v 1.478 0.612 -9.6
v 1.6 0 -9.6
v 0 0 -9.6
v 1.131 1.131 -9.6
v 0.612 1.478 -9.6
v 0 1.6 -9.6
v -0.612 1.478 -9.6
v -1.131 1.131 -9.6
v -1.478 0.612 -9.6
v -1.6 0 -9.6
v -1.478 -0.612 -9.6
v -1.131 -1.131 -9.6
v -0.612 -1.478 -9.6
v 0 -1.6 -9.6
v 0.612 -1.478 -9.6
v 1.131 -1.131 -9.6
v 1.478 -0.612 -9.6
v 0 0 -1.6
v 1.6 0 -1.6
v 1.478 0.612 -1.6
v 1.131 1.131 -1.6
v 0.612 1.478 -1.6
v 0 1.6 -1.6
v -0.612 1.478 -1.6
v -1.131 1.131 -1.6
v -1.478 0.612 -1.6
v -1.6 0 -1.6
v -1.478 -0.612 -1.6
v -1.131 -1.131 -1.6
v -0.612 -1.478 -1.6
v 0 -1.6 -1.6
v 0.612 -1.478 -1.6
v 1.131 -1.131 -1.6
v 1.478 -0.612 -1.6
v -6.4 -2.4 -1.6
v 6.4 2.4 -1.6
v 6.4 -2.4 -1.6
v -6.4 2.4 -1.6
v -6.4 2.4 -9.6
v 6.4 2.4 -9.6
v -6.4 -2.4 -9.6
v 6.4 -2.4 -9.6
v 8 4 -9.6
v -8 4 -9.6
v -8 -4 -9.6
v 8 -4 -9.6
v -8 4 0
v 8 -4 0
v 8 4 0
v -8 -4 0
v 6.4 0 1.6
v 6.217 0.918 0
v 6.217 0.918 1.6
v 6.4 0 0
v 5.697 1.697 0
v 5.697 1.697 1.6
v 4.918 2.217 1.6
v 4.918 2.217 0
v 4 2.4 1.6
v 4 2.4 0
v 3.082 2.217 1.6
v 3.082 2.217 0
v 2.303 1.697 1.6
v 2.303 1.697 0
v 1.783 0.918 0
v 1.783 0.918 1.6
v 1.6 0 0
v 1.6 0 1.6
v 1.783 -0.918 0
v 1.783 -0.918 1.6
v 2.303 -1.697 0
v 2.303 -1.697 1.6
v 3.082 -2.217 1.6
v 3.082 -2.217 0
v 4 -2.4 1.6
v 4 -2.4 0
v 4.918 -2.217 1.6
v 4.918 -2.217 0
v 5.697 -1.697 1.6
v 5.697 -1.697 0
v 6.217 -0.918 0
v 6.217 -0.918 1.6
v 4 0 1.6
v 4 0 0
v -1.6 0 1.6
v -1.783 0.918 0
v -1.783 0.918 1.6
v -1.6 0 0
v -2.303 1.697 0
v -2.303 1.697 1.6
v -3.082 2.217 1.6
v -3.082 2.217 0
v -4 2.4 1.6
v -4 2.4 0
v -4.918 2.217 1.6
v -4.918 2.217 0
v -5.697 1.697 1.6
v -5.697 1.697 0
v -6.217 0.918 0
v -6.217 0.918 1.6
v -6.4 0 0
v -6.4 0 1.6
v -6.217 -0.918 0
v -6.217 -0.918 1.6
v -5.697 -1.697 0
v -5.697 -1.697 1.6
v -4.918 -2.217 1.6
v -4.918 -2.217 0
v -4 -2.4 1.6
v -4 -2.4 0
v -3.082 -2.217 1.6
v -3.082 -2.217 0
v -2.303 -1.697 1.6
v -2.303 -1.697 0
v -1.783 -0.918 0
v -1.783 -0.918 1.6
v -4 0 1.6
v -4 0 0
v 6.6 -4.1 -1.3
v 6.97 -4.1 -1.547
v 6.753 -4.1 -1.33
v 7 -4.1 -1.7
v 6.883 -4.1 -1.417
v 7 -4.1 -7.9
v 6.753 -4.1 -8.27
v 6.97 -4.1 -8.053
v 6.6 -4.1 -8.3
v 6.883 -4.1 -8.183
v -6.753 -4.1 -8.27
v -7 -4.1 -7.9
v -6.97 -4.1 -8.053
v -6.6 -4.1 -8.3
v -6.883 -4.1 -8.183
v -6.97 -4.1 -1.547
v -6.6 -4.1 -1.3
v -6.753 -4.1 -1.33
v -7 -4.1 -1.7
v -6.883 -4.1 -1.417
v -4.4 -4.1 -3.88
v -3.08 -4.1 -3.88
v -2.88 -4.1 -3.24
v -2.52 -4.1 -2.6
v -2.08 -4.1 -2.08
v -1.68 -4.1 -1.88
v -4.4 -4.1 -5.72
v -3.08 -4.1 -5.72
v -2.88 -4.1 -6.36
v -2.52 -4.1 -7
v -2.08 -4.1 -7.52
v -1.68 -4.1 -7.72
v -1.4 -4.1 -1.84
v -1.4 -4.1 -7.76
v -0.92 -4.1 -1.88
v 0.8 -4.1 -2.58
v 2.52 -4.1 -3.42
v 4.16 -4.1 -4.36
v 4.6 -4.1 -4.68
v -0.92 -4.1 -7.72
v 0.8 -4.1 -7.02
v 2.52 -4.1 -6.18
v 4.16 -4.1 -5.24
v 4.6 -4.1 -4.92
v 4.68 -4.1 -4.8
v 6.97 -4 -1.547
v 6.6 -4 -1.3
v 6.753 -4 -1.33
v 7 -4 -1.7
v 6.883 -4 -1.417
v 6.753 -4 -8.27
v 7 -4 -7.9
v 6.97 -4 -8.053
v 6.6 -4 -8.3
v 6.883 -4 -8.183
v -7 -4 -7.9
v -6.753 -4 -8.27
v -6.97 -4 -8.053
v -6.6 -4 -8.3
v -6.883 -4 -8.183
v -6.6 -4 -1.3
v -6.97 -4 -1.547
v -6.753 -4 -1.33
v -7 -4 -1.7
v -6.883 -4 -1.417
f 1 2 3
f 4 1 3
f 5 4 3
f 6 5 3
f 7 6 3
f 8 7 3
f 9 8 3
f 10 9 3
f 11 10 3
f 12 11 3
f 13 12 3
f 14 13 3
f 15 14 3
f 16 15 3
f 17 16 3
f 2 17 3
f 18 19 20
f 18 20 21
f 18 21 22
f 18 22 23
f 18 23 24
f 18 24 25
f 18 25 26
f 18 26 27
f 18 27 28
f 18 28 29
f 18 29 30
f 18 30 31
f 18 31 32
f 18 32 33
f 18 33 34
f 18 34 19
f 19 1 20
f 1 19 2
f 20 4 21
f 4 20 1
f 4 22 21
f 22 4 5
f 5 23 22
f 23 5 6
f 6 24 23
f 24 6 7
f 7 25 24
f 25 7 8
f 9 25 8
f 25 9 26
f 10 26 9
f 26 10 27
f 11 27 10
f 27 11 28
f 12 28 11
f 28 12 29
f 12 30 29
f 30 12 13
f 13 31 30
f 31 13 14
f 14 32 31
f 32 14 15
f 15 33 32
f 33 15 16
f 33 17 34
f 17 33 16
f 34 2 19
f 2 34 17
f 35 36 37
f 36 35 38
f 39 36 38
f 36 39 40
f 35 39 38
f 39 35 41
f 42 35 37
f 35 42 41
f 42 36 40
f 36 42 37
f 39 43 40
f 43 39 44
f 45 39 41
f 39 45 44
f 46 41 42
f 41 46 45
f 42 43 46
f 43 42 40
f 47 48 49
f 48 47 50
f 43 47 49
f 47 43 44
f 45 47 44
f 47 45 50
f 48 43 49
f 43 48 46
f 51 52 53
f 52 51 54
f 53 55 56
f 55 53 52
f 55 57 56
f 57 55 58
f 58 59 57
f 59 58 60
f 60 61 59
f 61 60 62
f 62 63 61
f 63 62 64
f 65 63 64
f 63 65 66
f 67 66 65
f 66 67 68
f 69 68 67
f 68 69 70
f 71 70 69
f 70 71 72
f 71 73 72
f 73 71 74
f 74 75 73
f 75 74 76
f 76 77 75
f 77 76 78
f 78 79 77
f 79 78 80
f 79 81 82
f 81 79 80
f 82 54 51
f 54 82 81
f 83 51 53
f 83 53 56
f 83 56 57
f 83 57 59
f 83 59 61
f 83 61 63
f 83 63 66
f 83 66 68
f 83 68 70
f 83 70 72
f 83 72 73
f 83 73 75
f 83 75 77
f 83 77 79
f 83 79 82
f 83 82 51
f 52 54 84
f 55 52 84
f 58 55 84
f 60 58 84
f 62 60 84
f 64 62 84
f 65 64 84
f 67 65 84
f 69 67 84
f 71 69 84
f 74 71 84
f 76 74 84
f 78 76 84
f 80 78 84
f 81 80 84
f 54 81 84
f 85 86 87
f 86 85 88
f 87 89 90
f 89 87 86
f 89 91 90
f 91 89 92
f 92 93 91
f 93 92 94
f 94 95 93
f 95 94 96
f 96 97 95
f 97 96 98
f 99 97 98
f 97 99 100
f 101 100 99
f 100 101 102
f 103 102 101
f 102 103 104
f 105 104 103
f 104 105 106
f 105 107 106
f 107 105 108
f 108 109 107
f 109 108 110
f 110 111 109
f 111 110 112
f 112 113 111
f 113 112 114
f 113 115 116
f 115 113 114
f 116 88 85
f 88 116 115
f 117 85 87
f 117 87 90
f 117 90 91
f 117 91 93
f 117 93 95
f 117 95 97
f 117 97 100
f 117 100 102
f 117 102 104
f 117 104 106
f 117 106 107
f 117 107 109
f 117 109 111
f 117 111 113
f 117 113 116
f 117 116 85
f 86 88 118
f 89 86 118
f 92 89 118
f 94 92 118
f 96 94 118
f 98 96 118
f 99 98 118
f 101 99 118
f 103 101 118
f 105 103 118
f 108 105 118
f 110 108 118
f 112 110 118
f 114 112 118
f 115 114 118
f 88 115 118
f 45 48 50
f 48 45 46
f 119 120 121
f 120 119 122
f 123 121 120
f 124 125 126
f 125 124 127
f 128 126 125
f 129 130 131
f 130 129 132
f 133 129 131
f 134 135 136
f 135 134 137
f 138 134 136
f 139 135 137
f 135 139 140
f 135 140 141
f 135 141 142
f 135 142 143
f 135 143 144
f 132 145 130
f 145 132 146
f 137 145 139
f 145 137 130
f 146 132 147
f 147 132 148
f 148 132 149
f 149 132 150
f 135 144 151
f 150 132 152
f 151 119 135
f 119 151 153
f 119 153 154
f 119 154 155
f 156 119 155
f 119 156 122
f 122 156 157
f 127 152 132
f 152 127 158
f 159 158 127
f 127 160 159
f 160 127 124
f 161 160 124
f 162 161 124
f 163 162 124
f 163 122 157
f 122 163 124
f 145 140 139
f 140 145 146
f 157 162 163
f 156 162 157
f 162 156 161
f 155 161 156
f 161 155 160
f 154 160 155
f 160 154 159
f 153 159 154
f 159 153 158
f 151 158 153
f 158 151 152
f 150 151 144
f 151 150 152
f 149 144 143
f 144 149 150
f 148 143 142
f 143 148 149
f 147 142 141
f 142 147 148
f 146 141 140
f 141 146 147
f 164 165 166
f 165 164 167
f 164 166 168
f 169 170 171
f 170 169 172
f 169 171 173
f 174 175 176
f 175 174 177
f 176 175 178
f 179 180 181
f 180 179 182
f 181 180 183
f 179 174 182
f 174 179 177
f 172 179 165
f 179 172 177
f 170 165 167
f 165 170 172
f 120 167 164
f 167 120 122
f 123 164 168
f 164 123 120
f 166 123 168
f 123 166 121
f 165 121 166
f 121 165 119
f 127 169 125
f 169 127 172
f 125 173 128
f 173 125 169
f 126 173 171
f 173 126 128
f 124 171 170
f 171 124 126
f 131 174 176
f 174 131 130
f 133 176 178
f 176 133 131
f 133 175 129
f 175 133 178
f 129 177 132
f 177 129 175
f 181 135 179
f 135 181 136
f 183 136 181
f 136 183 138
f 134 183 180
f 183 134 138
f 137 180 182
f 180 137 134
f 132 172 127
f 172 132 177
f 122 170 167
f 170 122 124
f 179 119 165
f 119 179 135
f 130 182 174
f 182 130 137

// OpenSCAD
// file: ../p/4-4edge.scad
use <../lib.scad>
function ldraw_lib__4_4edge() = [
// 0 Circle 1.0
// 0 Name: 4-4edge.dat
// 0 Author: James Jessiman
// 0 !LDRAW_ORG Primitive UPDATE 2017-01
// 0 !LICENSE Licensed under CC BY 2.0 and CC BY 4.0 : see CAreadme.txt
// 
// 0 BFC CERTIFY CCW
  [0,"BFC","CERTIFY"],
  [0,"BFC","CCW"],
// 
// 0 !HISTORY 1998-12-15 [PTadmin] Official Update 1998-10
// 0 !HISTORY 2005-12-28 [PTadmin] Official Update 2005-01
// 0 !HISTORY 2007-06-24 [PTadmin] Header formatted for Contributor Agreement
// 0 !HISTORY 2008-07-01 [PTadmin] Official Update 2008-01
// 0 !HISTORY 2017-01-15 [Steffen] BFCed
// 0 !HISTORY 2017-12-30 [PTadmin] Official Update 2017-01
// 
// 
// 2 24 1 0 0 0.9239 0 0.3827
  [2,24,1,0,0,0.9239,0,0.3827],
// 2 24 0.9239 0 0.3827 0.7071 0 0.7071
  [2,24,0.9239,0,0.3827,0.7071,0,0.7071],
// 2 24 0.7071 0 0.7071 0.3827 0 0.9239
  [2,24,0.7071,0,0.7071,0.3827,0,0.9239],
// 2 24 0.3827 0 0.9239 0 0 1
  [2,24,0.3827,0,0.9239,0,0,1],
// 2 24 0 0 1 -0.3827 0 0.9239
  [2,24,0,0,1,-0.3827,0,0.9239],
// 2 24 -0.3827 0 0.9239 -0.7071 0 0.7071
  [2,24,-0.3827,0,0.9239,-0.7071,0,0.7071],
// 2 24 -0.7071 0 0.7071 -0.9239 0 0.3827
  [2,24,-0.7071,0,0.7071,-0.9239,0,0.3827],
// 2 24 -0.9239 0 0.3827 -1 0 -0
  [2,24,-0.9239,0,0.3827,-1,0,-0],
// 2 24 -1 0 -0 -0.9239 0 -0.3827
  [2,24,-1,0,-0,-0.9239,0,-0.3827],
// 2 24 -0.9239 0 -0.3827 -0.7071 0 -0.7071
  [2,24,-0.9239,0,-0.3827,-0.7071,0,-0.7071],
// 2 24 -0.7071 0 -0.7071 -0.3827 0 -0.9239
  [2,24,-0.7071,0,-0.7071,-0.3827,0,-0.9239],
// 2 24 -0.3827 0 -0.9239 0 0 -1
  [2,24,-0.3827,0,-0.9239,0,0,-1],
// 2 24 0 0 -1 0.3827 0 -0.9239
  [2,24,0,0,-1,0.3827,0,-0.9239],
// 2 24 0.3827 0 -0.9239 0.7071 0 -0.7071
  [2,24,0.3827,0,-0.9239,0.7071,0,-0.7071],
// 2 24 0.7071 0 -0.7071 0.9239 0 -0.3827
  [2,24,0.7071,0,-0.7071,0.9239,0,-0.3827],
// 2 24 0.9239 0 -0.3827 1 0 0
  [2,24,0.9239,0,-0.3827,1,0,0],
];
module ldraw_lib__4_4edge(step=0, col=false, unit=2/5, alt=false, line=0.2, solid=!$preview)
    makepoly(ldraw_lib__4_4edge(), step=step, col=col, unit=unit, alt=alt, line=line, solid=solid);
ldraw_lib__4_4edge(line=0.2);
// file: ../p/4-4disc.scad
use <../lib.scad>
function ldraw_lib__4_4disc() = [
// 0 Disc 1.0
// 0 Name: 4-4disc.dat
// 0 Author: James Jessiman
// 0 !LDRAW_ORG Primitive UPDATE 2002-02
// 0 !LICENSE Licensed under CC BY 2.0 and CC BY 4.0 : see CAreadme.txt
// 
// 0 BFC CERTIFY CCW
  [0,"BFC","CERTIFY"],
  [0,"BFC","CCW"],
// 
// 0 !HISTORY 1998-12-15 [PTadmin] Official Update 1998-10
// 0 !HISTORY 2002-03-23 [sbliss] Added BFC statement
// 0 !HISTORY 2002-04-25 [PTadmin] Official Update 2002-02
// 0 !HISTORY 2007-06-24 [PTadmin] Header formatted for Contributor Agreement
// 0 !HISTORY 2008-07-01 [PTadmin] Official Update 2008-01
// 
// 
// 3 16 0 0 0 1 0 0 0.9239 0 0.3827
  [3,16,0,0,0,1,0,0,0.9239,0,0.3827],
// 3 16 0 0 0 0.9239 0 0.3827 0.7071 0 0.7071
  [3,16,0,0,0,0.9239,0,0.3827,0.7071,0,0.7071],
// 3 16 0 0 0 0.7071 0 0.7071 0.3827 0 0.9239
  [3,16,0,0,0,0.7071,0,0.7071,0.3827,0,0.9239],
// 3 16 0 0 0 0.3827 0 0.9239 0 0 1
  [3,16,0,0,0,0.3827,0,0.9239,0,0,1],
// 3 16 0 0 0 0 0 1 -0.3827 0 0.9239
  [3,16,0,0,0,0,0,1,-0.3827,0,0.9239],
// 3 16 0 0 0 -0.3827 0 0.9239 -0.7071 0 0.7071
  [3,16,0,0,0,-0.3827,0,0.9239,-0.7071,0,0.7071],
// 3 16 0 0 0 -0.7071 0 0.7071 -0.9239 0 0.3827
  [3,16,0,0,0,-0.7071,0,0.7071,-0.9239,0,0.3827],
// 3 16 0 0 0 -0.9239 0 0.3827 -1 0 -0
  [3,16,0,0,0,-0.9239,0,0.3827,-1,0,-0],
// 3 16 0 0 0 -1 0 -0 -0.9239 0 -0.3827
  [3,16,0,0,0,-1,0,-0,-0.9239,0,-0.3827],
// 3 16 0 0 0 -0.9239 0 -0.3827 -0.7071 0 -0.7071
  [3,16,0,0,0,-0.9239,0,-0.3827,-0.7071,0,-0.7071],
// 3 16 0 0 0 -0.7071 0 -0.7071 -0.3827 0 -0.9239
  [3,16,0,0,0,-0.7071,0,-0.7071,-0.3827,0,-0.9239],
// 3 16 0 0 0 -0.3827 0 -0.9239 0 0 -1
  [3,16,0,0,0,-0.3827,0,-0.9239,0,0,-1],
// 3 16 0 0 0 0 0 -1 0.3827 0 -0.9239
  [3,16,0,0,0,0,0,-1,0.3827,0,-0.9239],
// 3 16 0 0 0 0.3827 0 -0.9239 0.7071 0 -0.7071
  [3,16,0,0,0,0.3827,0,-0.9239,0.7071,0,-0.7071],
// 3 16 0 0 0 0.7071 0 -0.7071 0.9239 0 -0.3827
  [3,16,0,0,0,0.7071,0,-0.7071,0.9239,0,-0.3827],
// 3 16 0 0 0 0.9239 0 -0.3827 1 0 0
  [3,16,0,0,0,0.9239,0,-0.3827,1,0,0],
// 0
];
module ldraw_lib__4_4disc(step=0, col=false, unit=2/5, alt=false, line=0.2, solid=!$preview)
    makepoly(ldraw_lib__4_4disc(), step=step, col=col, unit=unit, alt=alt, line=line, solid=solid);
ldraw_lib__4_4disc(line=0.2);
// file: ../p/4-4cyli.scad
use <../lib.scad>
$fa=1; $fs=0.2;
function ldraw_lib__4_4cyli(realsolid=false) = [
// 0 Cylinder 1.0
// 0 Name: 4-4cyli.dat
// 0 Author: James Jessiman
// 0 !LDRAW_ORG Primitive UPDATE 2005-01
// 0 !LICENSE Licensed under CC BY 2.0 and CC BY 4.0 : see CAreadme.txt
// 
// 0 BFC CERTIFY CCW
  [0,"BFC","CERTIFY"],
  [0,"BFC","CCW"],
// 
// 0 !HISTORY 1998-12-15 [PTadmin] Official Update 1998-10
// 0 !HISTORY 2002-03-23 [sbliss] Added BFC statement; merged headers from files in distributions LDraw 0.27 and Complete.
// 0 !HISTORY 2002-04-25 [PTadmin] Official Update 2002-02
// 0 !HISTORY 2004-12-14 [guyvivan] BFC CCW
// 0 !HISTORY 2005-12-28 [PTadmin] Official Update 2005-01
// 0 !HISTORY 2007-06-24 [PTadmin] Header formatted for Contributor Agreement
// 0 !HISTORY 2008-07-01 [PTadmin] Official Update 2008-01
// 
// 
// 4 16 1 1 0 0.9239 1 0.3827 0.9239 0 0.3827 1 0 0
  [4,16,1,1,0,0.9239,1,0.3827,0.9239,0,0.3827,1,0,0],
// 5 24 1 0 0 1 1 0 0.9239 0 0.3827 0.9239 0 -0.3827
  [5,24,1,0,0,1,1,0,0.9239,0,0.3827,0.9239,0,-0.3827],
// 4 16 0.9239 1 0.3827 0.7071 1 0.7071 0.7071 0 0.7071 0.9239 0 0.3827
  [4,16,0.9239,1,0.3827,0.7071,1,0.7071,0.7071,0,0.7071,0.9239,0,0.3827],
// 5 24 0.9239 0 0.3827 0.9239 1 0.3827 0.7071 0 0.7071 1 0 0
  [5,24,0.9239,0,0.3827,0.9239,1,0.3827,0.7071,0,0.7071,1,0,0],
// 4 16 0.7071 1 0.7071 0.3827 1 0.9239 0.3827 0 0.9239 0.7071 0 0.7071
  [4,16,0.7071,1,0.7071,0.3827,1,0.9239,0.3827,0,0.9239,0.7071,0,0.7071],
// 5 24 0.7071 0 0.7071 0.7071 1 0.7071 0.3827 0 0.9239 0.9239 0 0.3827
  [5,24,0.7071,0,0.7071,0.7071,1,0.7071,0.3827,0,0.9239,0.9239,0,0.3827],
// 4 16 0.3827 1 0.9239 0 1 1 0 0 1 0.3827 0 0.9239
  [4,16,0.3827,1,0.9239,0,1,1,0,0,1,0.3827,0,0.9239],
// 5 24 0.3827 0 0.9239 0.3827 1 0.9239 0 0 1 0.7071 0 0.7071
  [5,24,0.3827,0,0.9239,0.3827,1,0.9239,0,0,1,0.7071,0,0.7071],
// 4 16 0 1 1 -0.3827 1 0.9239 -0.3827 0 0.9239 0 0 1
  [4,16,0,1,1,-0.3827,1,0.9239,-0.3827,0,0.9239,0,0,1],
// 5 24 0 0 1 0 1 1 -0.3827 0 0.9239 0.3827 0 0.9239
  [5,24,0,0,1,0,1,1,-0.3827,0,0.9239,0.3827,0,0.9239],
// 4 16 -0.3827 1 0.9239 -0.7071 1 0.7071 -0.7071 0 0.7071 -0.3827 0 0.9239
  [4,16,-0.3827,1,0.9239,-0.7071,1,0.7071,-0.7071,0,0.7071,-0.3827,0,0.9239],
// 5 24 -0.3827 0 0.9239 -0.3827 1 0.9239 -0.7071 0 0.7071 0 0 1
  [5,24,-0.3827,0,0.9239,-0.3827,1,0.9239,-0.7071,0,0.7071,0,0,1],
// 4 16 -0.7071 1 0.7071 -0.9239 1 0.3827 -0.9239 0 0.3827 -0.7071 0 0.7071
  [4,16,-0.7071,1,0.7071,-0.9239,1,0.3827,-0.9239,0,0.3827,-0.7071,0,0.7071],
// 5 24 -0.7071 0 0.7071 -0.7071 1 0.7071 -0.9239 0 0.3827 -0.3827 0 0.9239
  [5,24,-0.7071,0,0.7071,-0.7071,1,0.7071,-0.9239,0,0.3827,-0.3827,0,0.9239],
// 4 16 -0.9239 1 0.3827 -1 1 0 -1 0 0 -0.9239 0 0.3827
  [4,16,-0.9239,1,0.3827,-1,1,0,-1,0,0,-0.9239,0,0.3827],
// 5 24 -0.9239 0 0.3827 -0.9239 1 0.3827 -1 0 0 -0.7071 0 0.7071
  [5,24,-0.9239,0,0.3827,-0.9239,1,0.3827,-1,0,0,-0.7071,0,0.7071],
// 4 16 -1 1 0 -0.9239 1 -0.3827 -0.9239 0 -0.3827 -1 0 0
  [4,16,-1,1,0,-0.9239,1,-0.3827,-0.9239,0,-0.3827,-1,0,0],
// 5 24 -1 0 0 -1 1 0 -0.9239 0 -0.3827 -0.9239 0 0.3827
  [5,24,-1,0,0,-1,1,0,-0.9239,0,-0.3827,-0.9239,0,0.3827],
// 4 16 -0.9239 1 -0.3827 -0.7071 1 -0.7071 -0.7071 0 -0.7071 -0.9239 0 -0.3827
  [4,16,-0.9239,1,-0.3827,-0.7071,1,-0.7071,-0.7071,0,-0.7071,-0.9239,0,-0.3827],
// 5 24 -0.9239 0 -0.3827 -0.9239 1 -0.3827 -0.7071 0 -0.7071 -1 0 0
  [5,24,-0.9239,0,-0.3827,-0.9239,1,-0.3827,-0.7071,0,-0.7071,-1,0,0],
// 4 16 -0.7071 1 -0.7071 -0.3827 1 -0.9239 -0.3827 0 -0.9239 -0.7071 0 -0.7071
  [4,16,-0.7071,1,-0.7071,-0.3827,1,-0.9239,-0.3827,0,-0.9239,-0.7071,0,-0.7071],
// 5 24 -0.7071 0 -0.7071 -0.7071 1 -0.7071 -0.3827 0 -0.9239 -0.9239 0 -0.3827
  [5,24,-0.7071,0,-0.7071,-0.7071,1,-0.7071,-0.3827,0,-0.9239,-0.9239,0,-0.3827],
// 4 16 -0.3827 1 -0.9239 0 1 -1 0 0 -1 -0.3827 0 -0.9239
  [4,16,-0.3827,1,-0.9239,0,1,-1,0,0,-1,-0.3827,0,-0.9239],
// 5 24 -0.3827 0 -0.9239 -0.3827 1 -0.9239 0 0 -1 -0.7071 0 -0.7071
  [5,24,-0.3827,0,-0.9239,-0.3827,1,-0.9239,0,0,-1,-0.7071,0,-0.7071],
// 4 16 0 1 -1 0.3827 1 -0.9239 0.3827 0 -0.9239 0 0 -1
  [4,16,0,1,-1,0.3827,1,-0.9239,0.3827,0,-0.9239,0,0,-1],
// 5 24 0 0 -1 0 1 -1 0.3827 0 -0.9239 -0.3827 0 -0.9239
  [5,24,0,0,-1,0,1,-1,0.3827,0,-0.9239,-0.3827,0,-0.9239],
// 4 16 0.3827 1 -0.9239 0.7071 1 -0.7071 0.7071 0 -0.7071 0.3827 0 -0.9239
  [4,16,0.3827,1,-0.9239,0.7071,1,-0.7071,0.7071,0,-0.7071,0.3827,0,-0.9239],
// 5 24 0.3827 0 -0.9239 0.3827 1 -0.9239 0.7071 0 -0.7071 0 0 -1
  [5,24,0.3827,0,-0.9239,0.3827,1,-0.9239,0.7071,0,-0.7071,0,0,-1],
// 4 16 0.7071 1 -0.7071 0.9239 1 -0.3827 0.9239 0 -0.3827 0.7071 0 -0.7071
  [4,16,0.7071,1,-0.7071,0.9239,1,-0.3827,0.9239,0,-0.3827,0.7071,0,-0.7071],
// 5 24 0.7071 0 -0.7071 0.7071 1 -0.7071 0.9239 0 -0.3827 0.3827 0 -0.9239
  [5,24,0.7071,0,-0.7071,0.7071,1,-0.7071,0.9239,0,-0.3827,0.3827,0,-0.9239],
// 4 16 0.9239 1 -0.3827 1 1 0 1 0 0 0.9239 0 -0.3827
  [4,16,0.9239,1,-0.3827,1,1,0,1,0,0,0.9239,0,-0.3827],
// 5 24 0.9239 0 -0.3827 0.9239 1 -0.3827 1 0 0 0.7071 0 -0.7071
  [5,24,0.9239,0,-0.3827,0.9239,1,-0.3827,1,0,0,0.7071,0,-0.7071],
// 0
];
module ldraw_lib__4_4cyli(step=0, col=false, unit=2/5, alt=false, line=0.2, solid=!$preview)
    makepoly(ldraw_lib__4_4cyli(solid), step=step, col=col, unit=unit, alt=alt, line=line, solid=solid);
ldraw_lib__4_4cyli(line=0.2);
// file: ../p/stud3.scad
use <../lib.scad>
use <4-4cyli.scad>
use <4-4disc.scad>
use <4-4edge.scad>
function ldraw_lib__stud3() = [
// 0 Stud Tube Solid
// 0 Name: stud3.dat
// 0 Author: James Jessiman
// 0 !LDRAW_ORG Primitive UPDATE 2012-01
// 0 !LICENSE Licensed under CC BY 4.0 : see CAreadme.txt
// 
// 0 BFC CERTIFY CCW
  [0,"BFC","CERTIFY"],
  [0,"BFC","CCW"],
// 
// 0 !HISTORY 2002-04-04 [sbliss] Modified for BFC compliance
// 0 !HISTORY 2002-04-25 [PTadmin] Official Update 2002-02
// 0 !HISTORY 2007-06-24 [PTadmin] Header formatted for Contributor Agreement
// 0 !HISTORY 2008-07-01 [PTadmin] Official Update 2008-01
// 0 !HISTORY 2012-02-16 [Philo] Changed to CCW
// 0 !HISTORY 2012-03-30 [PTadmin] Official Update 2012-01
// 
// 
// 1 16 0 -4 0 4 0 0 0 1 0 0 0 4 4-4edge.dat
  [1,16,0,-4,0,4,0,0,0,1,0,0,0,4, ldraw_lib__4_4edge()],
// 1 16 0 0 0 4 0 0 0 1 0 0 0 4 4-4edge.dat
  [1,16,0,0,0,4,0,0,0,1,0,0,0,4, ldraw_lib__4_4edge()],
// 1 16 0 -4 0 4 0 0 0 1 0 0 0 4 4-4disc.dat
  [1,16,0,-4,0,4,0,0,0,1,0,0,0,4, ldraw_lib__4_4disc()],
  [-1,16,0,0,0,4,0,0,0,-1,0,0,0,4, ldraw_lib__4_4disc()],
// 1 16 0 -4 0 4 0 0 0 4 0 0 0 4 4-4cyli.dat
  [1,16,0,-4,0,4,0,0,0,4,0,0,0,4, ldraw_lib__4_4cyli()],
];
module ldraw_lib__stud3(step=0, col=false, unit=2/5, alt=false, line=0.2, solid=!$preview)
    makepoly(ldraw_lib__stud3(), step=step, col=col, unit=unit, alt=alt, line=line, solid=solid);
ldraw_lib__stud3(line=0.2);
// file: ../p/stud.scad
use <../lib.scad>
use <4-4cyli.scad>
use <4-4disc.scad>
use <4-4edge.scad>
function ldraw_lib__stud() = [
// 0 Stud
// 0 Name: stud.dat
// 0 Author: James Jessiman
// 0 !LDRAW_ORG Primitive UPDATE 2012-01
// 0 !LICENSE Licensed under CC BY 4.0 : see CAreadme.txt
// 
// 0 BFC CERTIFY CCW
  [0,"BFC","CERTIFY"],
  [0,"BFC","CCW"],
// 
// 0 !HISTORY 2002-04-04 [sbliss] Modified for BFC compliance
// 0 !HISTORY 2002-04-25 [PTadmin] Official Update 2002-02
// 0 !HISTORY 2007-06-24 [PTadmin] Header formatted for Contributor Agreement
// 0 !HISTORY 2008-07-01 [PTadmin] Official Update 2008-01
// 0 !HISTORY 2012-02-16 [Philo] Changed to CCW
// 0 !HISTORY 2012-03-30 [PTadmin] Official Update 2012-01
// 
// 
// 1 16 0 0 0 6 0 0 0 1 0 0 0 6 4-4edge.dat
  [1,16,0,0,0,6,0,0,0,1,0,0,0,6, ldraw_lib__4_4edge()],
// 1 16 0 -4 0 6 0 0 0 1 0 0 0 6 4-4edge.dat
  [1,16,0,-4,0,6,0,0,0,1,0,0,0,6, ldraw_lib__4_4edge()],
// 1 16 0 0 0 6 0 0 0 -4 0 0 0 6 4-4cyli.dat
  [1,16,0,0,0,6,0,0,0,-4,0,0,0,6, ldraw_lib__4_4cyli()],
// 1 16 0 -4 0 6 0 0 0 1 0 0 0 6 4-4disc.dat
  [1,16,0,-4,0,6,0,0,0,1,0,0,0,6, ldraw_lib__4_4disc()],
  [-1,16,0,0,0,6,0,0,0,-1,0,0,0,6, ldraw_lib__4_4disc()],
];
module ldraw_lib__stud(step=0, col=false, unit=2/5, alt=false, line=0.2, solid=!$preview)
    makepoly(ldraw_lib__stud(), step=step, col=col, unit=unit, alt=alt, line=line, solid=solid);
ldraw_lib__stud(line=0.2);
// file: ../p/box5.scad
use <../lib.scad>
function ldraw_lib__box5() = [
// 0 Box with 5 Faces and All Edges
// 0 Name: box5.dat
// 0 Author: James Jessiman
// 0 !LDRAW_ORG Primitive UPDATE 2012-01
// 0 !LICENSE Licensed under CC BY 2.0 and CC BY 4.0 : see CAreadme.txt
// 
// 0 BFC CERTIFY CCW
  [0,"BFC","CERTIFY"],
  [0,"BFC","CCW"],
// 
// 0 !HISTORY 2002-04-03 [sbliss] Modified for BFC compliance
// 0 !HISTORY 2002-04-25 [PTadmin] Official Update 2002-02
// 0 !HISTORY 2007-06-24 [PTadmin] Header formatted for Contributor Agreement
// 0 !HISTORY 2008-07-01 [PTadmin] Official Update 2008-01
// 0 !HISTORY 2012-02-16 [Philo] Changed to CCW
// 0 !HISTORY 2012-03-30 [PTadmin] Official Update 2012-01
// 
// 
// 2 24 1 1 1 -1 1 1
  [2,24,1,1,1,-1,1,1],
// 2 24 -1 1 1 -1 1 -1
  [2,24,-1,1,1,-1,1,-1],
// 2 24 -1 1 -1 1 1 -1
  [2,24,-1,1,-1,1,1,-1],
// 2 24 1 1 -1 1 1 1
  [2,24,1,1,-1,1,1,1],
// 2 24 1 0 1 -1 0 1
  [2,24,1,0,1,-1,0,1],
// 2 24 -1 0 1 -1 0 -1
  [2,24,-1,0,1,-1,0,-1],
// 2 24 -1 0 -1 1 0 -1
  [2,24,-1,0,-1,1,0,-1],
// 2 24 1 0 -1 1 0 1
  [2,24,1,0,-1,1,0,1],
// 2 24 1 0 1 1 1 1
  [2,24,1,0,1,1,1,1],
// 2 24 -1 0 1 -1 1 1
  [2,24,-1,0,1,-1,1,1],
// 2 24 1 0 -1 1 1 -1
  [2,24,1,0,-1,1,1,-1],
// 2 24 -1 0 -1 -1 1 -1
  [2,24,-1,0,-1,-1,1,-1],
// 4 16 -1 1 1 1 1 1 1 1 -1 -1 1 -1
  [4,16,-1,1,1,1,1,1,1,1,-1,-1,1,-1],
// 4 16 -1 1 1 -1 0 1 1 0 1 1 1 1
  [4,16,-1,1,1,-1,0,1,1,0,1,1,1,1],
// 4 16 -1 1 -1 -1 0 -1 -1 0 1 -1 1 1
  [4,16,-1,1,-1,-1,0,-1,-1,0,1,-1,1,1],
// 4 16 1 1 -1 1 0 -1 -1 0 -1 -1 1 -1
  [4,16,1,1,-1,1,0,-1,-1,0,-1,-1,1,-1],
// 4 16 1 1 1 1 0 1 1 0 -1 1 1 -1
  [4,16,1,1,1,1,0,1,1,0,-1,1,1,-1],
];
makepoly(ldraw_lib__box5(), line=0.2);
// file: ../p/box4t.scad
use <../lib.scad>
function ldraw_lib__box4t() = [
// 0 Box with 4 Adjacent Faces and All Edges
// 0 Name: box4t.dat
// 0 Author: Tore Eriksson [Tore_Eriksson]
// 0 !LDRAW_ORG Primitive UPDATE 2003-02
// 0 !LICENSE Licensed under CC BY 2.0 and CC BY 4.0 : see CAreadme.txt
// 
// 0 BFC CERTIFY CCW
  [0,"BFC","CERTIFY"],
  [0,"BFC","CCW"],
// 
// 0 !HISTORY 1997-09-29 [PTadmin] Official Update 1997-15
// 0 !HISTORY 2002-08-31 [izanette] Modified with WINDZ for BFC compliance
// 0 !HISTORY 2003-08-01 [PTadmin] Official Update 2003-02
// 0 !HISTORY 2007-06-24 [PTadmin] Header formatted for Contributor Agreement
// 0 !HISTORY 2008-07-01 [PTadmin] Official Update 2008-01
// 
// 
// 2 24 1 1 1 -1 1 1
  [2,24,1,1,1,-1,1,1],
// 2 24 -1 1 1 -1 1 -1
  [2,24,-1,1,1,-1,1,-1],
// 2 24 -1 1 -1 1 1 -1
  [2,24,-1,1,-1,1,1,-1],
// 2 24 1 1 -1 1 1 1
  [2,24,1,1,-1,1,1,1],
// 2 24 1 0 1 -1 0 1
  [2,24,1,0,1,-1,0,1],
// 2 24 -1 0 1 -1 0 -1
  [2,24,-1,0,1,-1,0,-1],
// 2 24 -1 0 -1 1 0 -1
  [2,24,-1,0,-1,1,0,-1],
// 2 24 1 0 -1 1 0 1
  [2,24,1,0,-1,1,0,1],
// 2 24 1 0 1 1 1 1
  [2,24,1,0,1,1,1,1],
// 2 24 -1 0 1 -1 1 1
  [2,24,-1,0,1,-1,1,1],
// 2 24 1 0 -1 1 1 -1
  [2,24,1,0,-1,1,1,-1],
// 2 24 -1 0 -1 -1 1 -1
  [2,24,-1,0,-1,-1,1,-1],
// 4 16 1 1 1 1 1 -1 -1 1 -1 -1 1 1
  [4,16,1,1,1,1,1,-1,-1,1,-1,-1,1,1],
// 4 16 1 1 1 -1 1 1 -1 0 1 1 0 1
  [4,16,1,1,1,-1,1,1,-1,0,1,1,0,1],
// 4 16 -1 1 1 -1 1 -1 -1 0 -1 -1 0 1
  [4,16,-1,1,1,-1,1,-1,-1,0,-1,-1,0,1],
// 0 4 16 -1 1 -1 -1 0 -1 1 0 -1 1 1 -1
// 4 16 1 1 -1 1 1 1 1 0 1 1 0 -1
  [4,16,1,1,-1,1,1,1,1,0,1,1,0,-1],
// 0
];
makepoly(ldraw_lib__box4t(), line=0.2);
// file: ../p/1-4cyli.scad
use <../lib.scad>
function ldraw_lib__1_4cyli() = [
// 0 Cylinder 0.25
// 0 Name: 1-4cyli.dat
// 0 Author: James Jessiman
// 0 !LDRAW_ORG Primitive UPDATE 2012-01
// 0 !LICENSE Licensed under CC BY 2.0 and CC BY 4.0 : see CAreadme.txt
// 
// 0 BFC CERTIFY CCW
  [0,"BFC","CERTIFY"],
  [0,"BFC","CCW"],
// 
// 0 !HISTORY 2002-03-23 [sbliss] Added BFC statement.
// 0 !HISTORY 2002-04-25 [PTadmin] Official Update 2002-02
// 0 !HISTORY 2007-06-22 [PTadmin] Header formatted for Contributor Agreement
// 0 !HISTORY 2008-07-01 [PTadmin] Official Update 2008-01
// 0 !HISTORY 2012-02-16 [Philo] Changed to CCW
// 0 !HISTORY 2012-03-30 [PTadmin] Official Update 2012-01
// 
// 
// 4 16 1 1 0 0.9239 1 0.3827 0.9239 0 0.3827 1 0 0
  [4,16,1,1,0,0.9239,1,0.3827,0.9239,0,0.3827,1,0,0],
// 5 24 1 0 0 1 1 0 0.9239 0 0.3827 1 0 -1
  [5,24,1,0,0,1,1,0,0.9239,0,0.3827,1,0,-1],
// 4 16 0.9239 1 0.3827 0.7071 1 0.7071 0.7071 0 0.7071 0.9239 0 0.3827
  [4,16,0.9239,1,0.3827,0.7071,1,0.7071,0.7071,0,0.7071,0.9239,0,0.3827],
// 5 24 0.9239 0 0.3827 0.9239 1 0.3827 0.7071 0 0.7071 1 0 0
  [5,24,0.9239,0,0.3827,0.9239,1,0.3827,0.7071,0,0.7071,1,0,0],
// 4 16 0.7071 1 0.7071 0.3827 1 0.9239 0.3827 0 0.9239 0.7071 0 0.7071
  [4,16,0.7071,1,0.7071,0.3827,1,0.9239,0.3827,0,0.9239,0.7071,0,0.7071],
// 5 24 0.7071 0 0.7071 0.7071 1 0.7071 0.3827 0 0.9239 0.9239 0 0.3827
  [5,24,0.7071,0,0.7071,0.7071,1,0.7071,0.3827,0,0.9239,0.9239,0,0.3827],
// 4 16 0.3827 1 0.9239 0 1 1 0 0 1 0.3827 0 0.9239
  [4,16,0.3827,1,0.9239,0,1,1,0,0,1,0.3827,0,0.9239],
// 5 24 0.3827 0 0.9239 0.3827 1 0.9239 0 0 1 0.7071 0 0.7071
  [5,24,0.3827,0,0.9239,0.3827,1,0.9239,0,0,1,0.7071,0,0.7071],
// 5 24 0 0 1 0 1 1 0.3827 0 0.9239 -1 0 1
  [5,24,0,0,1,0,1,1,0.3827,0,0.9239,-1,0,1],
];
module ldraw_lib__1_4cyli(step=0, col=false, unit=2/5, alt=false, line=0.2, solid=!$preview)
    makepoly(ldraw_lib__1_4cyli(), step=step, col=col, unit=unit, alt=alt, line=line, solid=solid);
ldraw_lib__1_4cyli(line=0.2);
// file: ../p/1-4chrd.scad
use <../lib.scad>
$fa=1; $fs=0.2;
function ldraw_lib__1_4chrd(realsolid=false) = [
// 0 Chord 0.25
// 0 Name: 1-4chrd.dat
// 0 Author: Tony Hafner [hafhead]
// 0 !LDRAW_ORG Primitive UPDATE 2012-02
// 0 !LICENSE Licensed under CC BY 2.0 and CC BY 4.0 : see CAreadme.txt
// 
// 0 BFC CERTIFY CCW
  [0,"BFC","CERTIFY"],
  [0,"BFC","CCW"],
// 
// 0 !HISTORY 2004-04-22 [PTadmin] Official Update 2004-02
// 0 !HISTORY 2007-10-09 [PTadmin] Header formatted for Contributor Agreement
// 0 !HISTORY 2008-07-01 [PTadmin] Official Update 2008-01
// 0 !HISTORY 2012-08-02 [MMR1988] Re-creation with PrimGen2 and Rectifier
// 0 !HISTORY 2012-08-09 [PTadmin] Official Update 2012-02
// 
// 
// 4 16 0.9239 0 0.3827 0.3827 0 0.9239 0 0 1 1 0 0
  [4,16,0.9239,0,0.3827,0.3827,0,0.9239,0,0,1,1,0,0],
// 3 16 0.7071 0 0.7071 0.3827 0 0.9239 0.9239 0 0.3827
  [3,16,0.7071,0,0.7071,0.3827,0,0.9239,0.9239,0,0.3827],
];
module ldraw_lib__1_4chrd(step=0, col=false, unit=2/5, alt=false, line=0.2, solid=!$preview)
    makepoly(ldraw_lib__1_4chrd(solid), step=step, col=col, unit=unit, alt=alt, line=line, solid=solid);
ldraw_lib__1_4chrd(line=0.2);
// file: s/3004s01.scad
use <../../lib.scad>
use <../../p/box4t.scad>
use <../../p/box5.scad>
use <../../p/stud.scad>
use <../../p/stud3.scad>
$fa=1; $fs=0.2;
function ldraw_lib__s__3004s01(realsolid=false) = [
// 0 ~Brick  1 x  2 without Front Face
// 0 Name: s\3004s01.dat
// 0 Author: James Jessiman
// 0 !LDRAW_ORG Subpart UPDATE 2003-03
// 0 !LICENSE Licensed under CC BY 2.0 and CC BY 4.0 : see CAreadme.txt
// 
// 0 BFC CERTIFY CCW
  [0,"BFC","CERTIFY"],
  [0,"BFC","CCW"],
// 
// 0 !HISTORY 2003-09-07 [jriley] Subfiling, BFC
// 0 !HISTORY 2003-12-19 [PTadmin] Official Update 2003-03
// 0 !HISTORY 2007-08-29 [PTadmin] Header formatted for Contributor Agreement
// 0 !HISTORY 2008-07-01 [PTadmin] Official Update 2008-01
// 
// 
// 1 16 0 4 0 1 0 0 0 -5 0 0 0 1 stud3.dat
  [1,16,0,4,0,1,0,0,0,-5,0,0,0,1, ldraw_lib__stud3(realsolid)],
// 0 BFC INVERTNEXT
  [0,"BFC","INVERTNEXT"],
// 1 16 0 24 0 16 0 0 0 -20 0 0 0 6 box5.dat
  [1,16,0,24,0,16,0,0,0,-20,0,0,0,6, ldraw_lib__box5(realsolid)],
// 4 16 20 24 10 16 24 6 -16 24 6 -20 24 10
  [4,16,20,24,10,16,24,6,-16,24,6,-20,24,10],
// 4 16 -20 24 10 -16 24 6 -16 24 -6 -20 24 -10
  [4,16,-20,24,10,-16,24,6,-16,24,-6,-20,24,-10],
// 4 16 -20 24 -10 -16 24 -6 16 24 -6 20 24 -10
  [4,16,-20,24,-10,-16,24,-6,16,24,-6,20,24,-10],
// 4 16 20 24 -10 16 24 -6 16 24 6 20 24 10
  [4,16,20,24,-10,16,24,-6,16,24,6,20,24,10],
// 1 16 0 24 0 20 0 0 0 -24 0 0 0 10 box4t.dat
  [1,16,0,24,0,20,0,0,0,-24,0,0,0,10, ldraw_lib__box4t(realsolid)],
// 1 16 10 0 0 1 0 0 0 1 0 0 0 1 stud.dat
  [1,16,10,0,0,1,0,0,0,1,0,0,0,1, ldraw_lib__stud(realsolid)],
// 1 16 -10 0 0 1 0 0 0 1 0 0 0 1 stud.dat
  [1,16,-10,0,0,1,0,0,0,1,0,0,0,1, ldraw_lib__stud(realsolid)],
// 0
];
module ldraw_lib__s__3004s01(step=0, col=false, unit=2/5, alt=false, line=0.2, solid=!$preview)
    makepoly(ldraw_lib__s__3004s01(solid), step=step, col=col, unit=unit, alt=alt, line=line, solid=solid);
ldraw_lib__s__3004s01(line=0.2);
// file: 6041468b.scad
use <../lib.scad>
use <../p/1-4chrd.scad>
use <../p/1-4cyli.scad>
$fa=1; $fs=0.2;
function ldraw_lib__6041468b(realsolid=false) = [
// 0 Sticker  0.9 x  1.9 with Dark Red Arrow
// 0 Name: 6041468b.dat
// 0 Author: Evert-Jan Boer [ejboer]
// 0 !LDRAW_ORG Part UPDATE 2022-04
// 0 !LICENSE Licensed under CC BY 2.0 and CC BY 4.0 : see CAreadme.txt
// 
// 0 BFC CERTIFY CCW
  [0,"BFC","CERTIFY"],
  [0,"BFC","CCW"],
// 
// 0 !KEYWORDS Set 10240, Star Wars, X-Wing
// 
// 0 !HISTORY 2022-07-18 [PTadmin] Official Update 2022-04
// 
// 
// 1 15 16.5 -.25 7.75 1 0 0 0 1 0 0 0 1 1-4chrd.dat
  [1,15,16.5,-.25,7.75,1,0,0,0,1,0,0,0,1, ldraw_lib__1_4chrd(realsolid)],
// 1 15 16.5 -.25 -7.75 0 0 1 0 1 0 -1 0 0 1-4chrd.dat
  [1,15,16.5,-.25,-7.75,0,0,1,0,1,0,-1,0,0, ldraw_lib__1_4chrd(realsolid)],
// 1 15 -16.5 -.25 -7.75 -1 0 0 0 1 0 0 0 -1 1-4chrd.dat
  [1,15,-16.5,-.25,-7.75,-1,0,0,0,1,0,0,0,-1, ldraw_lib__1_4chrd(realsolid)],
// 1 15 -16.5 -.25 7.75 0 0 -1 0 1 0 1 0 0 1-4chrd.dat
  [1,15,-16.5,-.25,7.75,0,0,-1,0,1,0,1,0,0, ldraw_lib__1_4chrd(realsolid)],
// 4 15 -17.5 -.25 7.75 -11 -.25 2.3 -7.7 -.25 2.3 -16.5 -.25 8.75
  [4,15,-17.5,-.25,7.75,-11,-.25,2.3,-7.7,-.25,2.3,-16.5,-.25,8.75],
// 3 15 -16.5 -.25 8.75 -7.7 -.25 2.3 -7.2 -.25 3.9
  [3,15,-16.5,-.25,8.75,-7.7,-.25,2.3,-7.2,-.25,3.9],
// 3 15 -16.5 -.25 8.75 -7.2 -.25 3.9 -6.3 -.25 5.5
  [3,15,-16.5,-.25,8.75,-7.2,-.25,3.9,-6.3,-.25,5.5],
// 3 15 -16.5 -.25 8.75 -6.3 -.25 5.5 -5.2 -.25 6.8
  [3,15,-16.5,-.25,8.75,-6.3,-.25,5.5,-5.2,-.25,6.8],
// 3 15 -16.5 -.25 8.75 -5.2 -.25 6.8 -4.2 -.25 7.3
  [3,15,-16.5,-.25,8.75,-5.2,-.25,6.8,-4.2,-.25,7.3],
// 4 15 -7.7 -.25 -2.3 -11 -.25 -2.3 -17.5 -.25 -7.75 -16.5 -.25 -8.75
  [4,15,-7.7,-.25,-2.3,-11,-.25,-2.3,-17.5,-.25,-7.75,-16.5,-.25,-8.75],
// 4 15 -11 -.25 -2.3 -11 -.25 2.3 -17.5 -.25 7.75 -17.5 -.25 -7.75
  [4,15,-11,-.25,-2.3,-11,-.25,2.3,-17.5,-.25,7.75,-17.5,-.25,-7.75],
// 3 15 -7.7 -.25 -2.3 -16.5 -.25 -8.75 -7.2 -.25 -3.9
  [3,15,-7.7,-.25,-2.3,-16.5,-.25,-8.75,-7.2,-.25,-3.9],
// 3 15 -7.2 -.25 -3.9 -16.5 -.25 -8.75 -6.3 -.25 -5.5
  [3,15,-7.2,-.25,-3.9,-16.5,-.25,-8.75,-6.3,-.25,-5.5],
// 3 15 -6.3 -.25 -5.5 -16.5 -.25 -8.75 -5.2 -.25 -6.8
  [3,15,-6.3,-.25,-5.5,-16.5,-.25,-8.75,-5.2,-.25,-6.8],
// 3 15 -5.2 -.25 -6.8 -16.5 -.25 -8.75 -4.2 -.25 -7.3
  [3,15,-5.2,-.25,-6.8,-16.5,-.25,-8.75,-4.2,-.25,-7.3],
// 3 15 -16.5 -.25 8.75 -4.2 -.25 7.3 -3.5 -.25 7.4
  [3,15,-16.5,-.25,8.75,-4.2,-.25,7.3,-3.5,-.25,7.4],
// 3 15 -4.2 -.25 -7.3 -16.5 -.25 -8.75 -3.5 -.25 -7.4
  [3,15,-4.2,-.25,-7.3,-16.5,-.25,-8.75,-3.5,-.25,-7.4],
// 4 15 -16.5 -.25 8.75 -3.5 -.25 7.4 -2.3 -.25 7.3 16.5 -.25 8.75
  [4,15,-16.5,-.25,8.75,-3.5,-.25,7.4,-2.3,-.25,7.3,16.5,-.25,8.75],
// 3 15 16.5 -.25 8.75 -2.3 -.25 7.3 2 -.25 5.55
  [3,15,16.5,-.25,8.75,-2.3,-.25,7.3,2,-.25,5.55],
// 3 15 16.5 -.25 8.75 2 -.25 5.55 6.3 -.25 3.45
  [3,15,16.5,-.25,8.75,2,-.25,5.55,6.3,-.25,3.45],
// 4 15 6.3 -.25 3.45 10.4 -.25 1.1 17.5 -.25 7.75 16.5 -.25 8.75
  [4,15,6.3,-.25,3.45,10.4,-.25,1.1,17.5,-.25,7.75,16.5,-.25,8.75],
// 3 15 17.5 -.25 7.75 10.4 -.25 1.1 11.5 -.25 .3
  [3,15,17.5,-.25,7.75,10.4,-.25,1.1,11.5,-.25,.3],
// 4 15 -16.5 -.25 -8.75 16.5 -.25 -8.75 -2.3 -.25 -7.3 -3.5 -.25 -7.4
  [4,15,-16.5,-.25,-8.75,16.5,-.25,-8.75,-2.3,-.25,-7.3,-3.5,-.25,-7.4],
// 3 15 2 -.25 -5.55 -2.3 -.25 -7.3 16.5 -.25 -8.75
  [3,15,2,-.25,-5.55,-2.3,-.25,-7.3,16.5,-.25,-8.75],
// 4 15 2 -.25 -5.55 16.5 -.25 -8.75 17.5 -.25 -7.75 6.3 -.25 -3.45
  [4,15,2,-.25,-5.55,16.5,-.25,-8.75,17.5,-.25,-7.75,6.3,-.25,-3.45],
// 3 15 10.4 -.25 -1.1 6.3 -.25 -3.45 17.5 -.25 -7.75
  [3,15,10.4,-.25,-1.1,6.3,-.25,-3.45,17.5,-.25,-7.75],
// 3 15 11.5 -.25 -.3 10.4 -.25 -1.1 17.5 -.25 -7.75
  [3,15,11.5,-.25,-.3,10.4,-.25,-1.1,17.5,-.25,-7.75],
// 3 15 11.7 -.25 0 11.5 -.25 -.3 17.5 -.25 -7.75
  [3,15,11.7,-.25,0,11.5,-.25,-.3,17.5,-.25,-7.75],
// 4 15 11.5 -.25 .3 11.7 -.25 0 17.5 -.25 -7.75 17.5 -.25 7.75
  [4,15,11.5,-.25,.3,11.7,-.25,0,17.5,-.25,-7.75,17.5,-.25,7.75],
// 4 320 -11 -.25 2.3 -11 -.25 -2.3 -7.7 -.25 -2.3 -7.7 -.25 2.3
  [4,320,-11,-.25,2.3,-11,-.25,-2.3,-7.7,-.25,-2.3,-7.7,-.25,2.3],
// 3 320 11.5 -.25 .3 11.5 -.25 -.3 11.7 -.25 0
  [3,320,11.5,-.25,.3,11.5,-.25,-.3,11.7,-.25,0],
// 4 320 10.4 -.25 1.1 10.4 -.25 -1.1 11.5 -.25 -.3 11.5 -.25 .3
  [4,320,10.4,-.25,1.1,10.4,-.25,-1.1,11.5,-.25,-.3,11.5,-.25,.3],
// 4 320 6.3 -.25 3.45 6.3 -.25 -3.45 10.4 -.25 -1.1 10.4 -.25 1.1
  [4,320,6.3,-.25,3.45,6.3,-.25,-3.45,10.4,-.25,-1.1,10.4,-.25,1.1],
// 4 320 2 -.25 5.55 2 -.25 -5.55 6.3 -.25 -3.45 6.3 -.25 3.45
  [4,320,2,-.25,5.55,2,-.25,-5.55,6.3,-.25,-3.45,6.3,-.25,3.45],
// 4 320 -2.3 -.25 7.3 -2.3 -.25 -7.3 2 -.25 -5.55 2 -.25 5.55
  [4,320,-2.3,-.25,7.3,-2.3,-.25,-7.3,2,-.25,-5.55,2,-.25,5.55],
// 4 320 -3.5 -.25 7.4 -3.5 -.25 -7.4 -2.3 -.25 -7.3 -2.3 -.25 7.3
  [4,320,-3.5,-.25,7.4,-3.5,-.25,-7.4,-2.3,-.25,-7.3,-2.3,-.25,7.3],
// 4 320 -4.2 -.25 7.3 -4.2 -.25 -7.3 -3.5 -.25 -7.4 -3.5 -.25 7.4
  [4,320,-4.2,-.25,7.3,-4.2,-.25,-7.3,-3.5,-.25,-7.4,-3.5,-.25,7.4],
// 4 320 -5.2 -.25 6.8 -5.2 -.25 -6.8 -4.2 -.25 -7.3 -4.2 -.25 7.3
  [4,320,-5.2,-.25,6.8,-5.2,-.25,-6.8,-4.2,-.25,-7.3,-4.2,-.25,7.3],
// 4 320 -6.3 -.25 5.5 -6.3 -.25 -5.5 -5.2 -.25 -6.8 -5.2 -.25 6.8
  [4,320,-6.3,-.25,5.5,-6.3,-.25,-5.5,-5.2,-.25,-6.8,-5.2,-.25,6.8],
// 4 320 -7.2 -.25 3.9 -7.2 -.25 -3.9 -6.3 -.25 -5.5 -6.3 -.25 5.5
  [4,320,-7.2,-.25,3.9,-7.2,-.25,-3.9,-6.3,-.25,-5.5,-6.3,-.25,5.5],
// 4 320 -7.7 -.25 2.3 -7.7 -.25 -2.3 -7.2 -.25 -3.9 -7.2 -.25 3.9
  [4,320,-7.7,-.25,2.3,-7.7,-.25,-2.3,-7.2,-.25,-3.9,-7.2,-.25,3.9],
// 
// 1 16 16.5 0 7.75 1 0 0 0 -1 0 0 0 1 1-4chrd.dat
  [1,16,16.5,0,7.75,1,0,0,0,-1,0,0,0,1, ldraw_lib__1_4chrd(realsolid)],
// 1 16 16.5 0 -7.75 0 0 1 0 -1 0 -1 0 0 1-4chrd.dat
  [1,16,16.5,0,-7.75,0,0,1,0,-1,0,-1,0,0, ldraw_lib__1_4chrd(realsolid)],
// 1 16 -16.5 0 -7.75 -1 0 0 0 -1 0 0 0 -1 1-4chrd.dat
  [1,16,-16.5,0,-7.75,-1,0,0,0,-1,0,0,0,-1, ldraw_lib__1_4chrd(realsolid)],
// 1 16 -16.5 0 7.75 0 0 -1 0 -1 0 1 0 0 1-4chrd.dat
  [1,16,-16.5,0,7.75,0,0,-1,0,-1,0,1,0,0, ldraw_lib__1_4chrd(realsolid)],
// 4 16 -16.5 0 -8.75 -17.5 0 -7.75 -17.5 0 7.75 -16.5 0 8.75
  [4,16,-16.5,0,-8.75,-17.5,0,-7.75,-17.5,0,7.75,-16.5,0,8.75],
// 4 16 16.5 0 8.75 16.5 0 -8.75 -16.5 0 -8.75 -16.5 0 8.75
  [4,16,16.5,0,8.75,16.5,0,-8.75,-16.5,0,-8.75,-16.5,0,8.75],
// 4 16 17.5 0 -7.75 16.5 0 -8.75 16.5 0 8.75 17.5 0 7.75
  [4,16,17.5,0,-7.75,16.5,0,-8.75,16.5,0,8.75,17.5,0,7.75],
// 
// 1 16 16.5 -.25 7.75 1 0 0 0 .25 0 0 0 1 1-4cyli.dat
  [1,16,16.5,-.25,7.75,1,0,0,0,.25,0,0,0,1, ldraw_lib__1_4cyli(realsolid)],
// 1 16 16.5 -.25 -7.75 0 0 1 0 .25 0 -1 0 0 1-4cyli.dat
  [1,16,16.5,-.25,-7.75,0,0,1,0,.25,0,-1,0,0, ldraw_lib__1_4cyli(realsolid)],
// 1 16 -16.5 -.25 -7.75 -1 0 0 0 .25 0 0 0 -1 1-4cyli.dat
  [1,16,-16.5,-.25,-7.75,-1,0,0,0,.25,0,0,0,-1, ldraw_lib__1_4cyli(realsolid)],
// 1 16 -16.5 -.25 7.75 0 0 -1 0 .25 0 1 0 0 1-4cyli.dat
  [1,16,-16.5,-.25,7.75,0,0,-1,0,.25,0,1,0,0, ldraw_lib__1_4cyli(realsolid)],
// 4 16 16.5 -.25 -8.75 -16.5 -.25 -8.75 -16.5 0 -8.75 16.5 0 -8.75
  [4,16,16.5,-.25,-8.75,-16.5,-.25,-8.75,-16.5,0,-8.75,16.5,0,-8.75],
// 4 16 17.5 -.25 7.75 17.5 -.25 -7.75 17.5 0 -7.75 17.5 0 7.75
  [4,16,17.5,-.25,7.75,17.5,-.25,-7.75,17.5,0,-7.75,17.5,0,7.75],
// 4 16 -16.5 -.25 8.75 16.5 -.25 8.75 16.5 0 8.75 -16.5 0 8.75
  [4,16,-16.5,-.25,8.75,16.5,-.25,8.75,16.5,0,8.75,-16.5,0,8.75],
// 4 16 -17.5 -.25 -7.75 -17.5 -.25 7.75 -17.5 0 7.75 -17.5 0 -7.75
  [4,16,-17.5,-.25,-7.75,-17.5,-.25,7.75,-17.5,0,7.75,-17.5,0,-7.75],
];
module ldraw_lib__6041468b(step=0, col=false, unit=2/5, alt=false, line=0.2, solid=!$preview)
    makepoly(ldraw_lib__6041468b(solid), step=step, col=col, unit=unit, alt=alt, line=line, solid=solid);
ldraw_lib__6041468b(line=0.2);
// file: 3004.scad
use <../lib.scad>
use <s/3004s01.scad>
function ldraw_lib__3004() = [
// 0 Brick  1 x  2
// 0 Name: 3004.dat
// 0 Author: James Jessiman
// 0 !LDRAW_ORG Part UPDATE 2022-05
// 0 !LICENSE Licensed under CC BY 2.0 and CC BY 4.0 : see CAreadme.txt
// 
// 0 BFC CERTIFY CCW
  [0,"BFC","CERTIFY"],
  [0,"BFC","CCW"],
// 
// 0 !HISTORY 2001-10-26 [PTadmin] Official Update 2001-01
// 0 !HISTORY 2002-05-07 {unknown} BFC Certification
// 0 !HISTORY 2002-06-11 [PTadmin] Official Update 2002-03
// 0 !HISTORY 2007-05-07 [PTadmin] Header formatted for Contributor Agreement
// 0 !HISTORY 2008-07-01 [PTadmin] Official Update 2008-01
// 0 !HISTORY 2022-08-04 [MagFors] Using subfile
// 0 !HISTORY 2022-09-15 [PTadmin] Official Update 2022-05
// 
// 
// 1 16 0 0 0 1 0 0 0 1 0 0 0 1 s\3004s01.dat
  [1,16,0,0,0,1,0,0,0,1,0,0,0,1, ldraw_lib__s__3004s01()],
// 4 16 -20 24 -10 20 24 -10 20 0 -10 -20 0 -10
  [4,16,-20,24,-10,20,24,-10,20,0,-10,-20,0,-10],
];
module ldraw_lib__3004(step=0, col=false, unit=2/5, alt=false, line=0.2, solid=!$preview)
    makepoly(ldraw_lib__3004(), step=step, col=col, unit=unit, alt=alt, line=line, solid=solid);
ldraw_lib__3004(line=0.2);
// main file
use <../lib.scad>
use <3004.scad>
use <6041468b.scad>
function ldraw_lib__3004d05() = [
// 0 Brick  1 x  2 with Dark Red Arrow Pointing Right Sticker
// 0 Name: 3004d05.dat
// 0 Author: Evert-Jan Boer [ejboer]
// 0 !LDRAW_ORG Shortcut UPDATE 2024-04
// 0 !LICENSE Licensed under CC BY 4.0 : see CAreadme.txt
// 
// 0 BFC CERTIFY CCW
  [0,"BFC","CERTIFY"],
  [0,"BFC","CCW"],
// 
// 0 !CATEGORY Sticker Shortcut
// 0 !KEYWORDS Bricklink 3004pb115R, Set 10240, Star Wars, X-Wing
// 
// 0 !HISTORY 2024-05-28 [OrionP] Official Update 2024-04
// 
// 1 16 0 0 0 1 0 0 0 1 0 0 0 1 3004.dat
  [1,16,0,0,0,1,0,0,0,1,0,0,0,1, ldraw_lib__3004()],
// 1 15 0 12 -10 1 0 0 0 0 -1 0 1 0 6041468b.dat
  [1,15,0,12,-10,1,0,0,0,0,-1,0,1,0, ldraw_lib__6041468b()],
];
module ldraw_lib__3004d05(step=0, col=false, unit=2/5, alt=false, line=0.2, solid=!$preview)
    makepoly(ldraw_lib__3004d05(), step=step, col=col, unit=unit, alt=alt, line=line, solid=solid);
ldraw_lib__3004d05(line=0.2);
